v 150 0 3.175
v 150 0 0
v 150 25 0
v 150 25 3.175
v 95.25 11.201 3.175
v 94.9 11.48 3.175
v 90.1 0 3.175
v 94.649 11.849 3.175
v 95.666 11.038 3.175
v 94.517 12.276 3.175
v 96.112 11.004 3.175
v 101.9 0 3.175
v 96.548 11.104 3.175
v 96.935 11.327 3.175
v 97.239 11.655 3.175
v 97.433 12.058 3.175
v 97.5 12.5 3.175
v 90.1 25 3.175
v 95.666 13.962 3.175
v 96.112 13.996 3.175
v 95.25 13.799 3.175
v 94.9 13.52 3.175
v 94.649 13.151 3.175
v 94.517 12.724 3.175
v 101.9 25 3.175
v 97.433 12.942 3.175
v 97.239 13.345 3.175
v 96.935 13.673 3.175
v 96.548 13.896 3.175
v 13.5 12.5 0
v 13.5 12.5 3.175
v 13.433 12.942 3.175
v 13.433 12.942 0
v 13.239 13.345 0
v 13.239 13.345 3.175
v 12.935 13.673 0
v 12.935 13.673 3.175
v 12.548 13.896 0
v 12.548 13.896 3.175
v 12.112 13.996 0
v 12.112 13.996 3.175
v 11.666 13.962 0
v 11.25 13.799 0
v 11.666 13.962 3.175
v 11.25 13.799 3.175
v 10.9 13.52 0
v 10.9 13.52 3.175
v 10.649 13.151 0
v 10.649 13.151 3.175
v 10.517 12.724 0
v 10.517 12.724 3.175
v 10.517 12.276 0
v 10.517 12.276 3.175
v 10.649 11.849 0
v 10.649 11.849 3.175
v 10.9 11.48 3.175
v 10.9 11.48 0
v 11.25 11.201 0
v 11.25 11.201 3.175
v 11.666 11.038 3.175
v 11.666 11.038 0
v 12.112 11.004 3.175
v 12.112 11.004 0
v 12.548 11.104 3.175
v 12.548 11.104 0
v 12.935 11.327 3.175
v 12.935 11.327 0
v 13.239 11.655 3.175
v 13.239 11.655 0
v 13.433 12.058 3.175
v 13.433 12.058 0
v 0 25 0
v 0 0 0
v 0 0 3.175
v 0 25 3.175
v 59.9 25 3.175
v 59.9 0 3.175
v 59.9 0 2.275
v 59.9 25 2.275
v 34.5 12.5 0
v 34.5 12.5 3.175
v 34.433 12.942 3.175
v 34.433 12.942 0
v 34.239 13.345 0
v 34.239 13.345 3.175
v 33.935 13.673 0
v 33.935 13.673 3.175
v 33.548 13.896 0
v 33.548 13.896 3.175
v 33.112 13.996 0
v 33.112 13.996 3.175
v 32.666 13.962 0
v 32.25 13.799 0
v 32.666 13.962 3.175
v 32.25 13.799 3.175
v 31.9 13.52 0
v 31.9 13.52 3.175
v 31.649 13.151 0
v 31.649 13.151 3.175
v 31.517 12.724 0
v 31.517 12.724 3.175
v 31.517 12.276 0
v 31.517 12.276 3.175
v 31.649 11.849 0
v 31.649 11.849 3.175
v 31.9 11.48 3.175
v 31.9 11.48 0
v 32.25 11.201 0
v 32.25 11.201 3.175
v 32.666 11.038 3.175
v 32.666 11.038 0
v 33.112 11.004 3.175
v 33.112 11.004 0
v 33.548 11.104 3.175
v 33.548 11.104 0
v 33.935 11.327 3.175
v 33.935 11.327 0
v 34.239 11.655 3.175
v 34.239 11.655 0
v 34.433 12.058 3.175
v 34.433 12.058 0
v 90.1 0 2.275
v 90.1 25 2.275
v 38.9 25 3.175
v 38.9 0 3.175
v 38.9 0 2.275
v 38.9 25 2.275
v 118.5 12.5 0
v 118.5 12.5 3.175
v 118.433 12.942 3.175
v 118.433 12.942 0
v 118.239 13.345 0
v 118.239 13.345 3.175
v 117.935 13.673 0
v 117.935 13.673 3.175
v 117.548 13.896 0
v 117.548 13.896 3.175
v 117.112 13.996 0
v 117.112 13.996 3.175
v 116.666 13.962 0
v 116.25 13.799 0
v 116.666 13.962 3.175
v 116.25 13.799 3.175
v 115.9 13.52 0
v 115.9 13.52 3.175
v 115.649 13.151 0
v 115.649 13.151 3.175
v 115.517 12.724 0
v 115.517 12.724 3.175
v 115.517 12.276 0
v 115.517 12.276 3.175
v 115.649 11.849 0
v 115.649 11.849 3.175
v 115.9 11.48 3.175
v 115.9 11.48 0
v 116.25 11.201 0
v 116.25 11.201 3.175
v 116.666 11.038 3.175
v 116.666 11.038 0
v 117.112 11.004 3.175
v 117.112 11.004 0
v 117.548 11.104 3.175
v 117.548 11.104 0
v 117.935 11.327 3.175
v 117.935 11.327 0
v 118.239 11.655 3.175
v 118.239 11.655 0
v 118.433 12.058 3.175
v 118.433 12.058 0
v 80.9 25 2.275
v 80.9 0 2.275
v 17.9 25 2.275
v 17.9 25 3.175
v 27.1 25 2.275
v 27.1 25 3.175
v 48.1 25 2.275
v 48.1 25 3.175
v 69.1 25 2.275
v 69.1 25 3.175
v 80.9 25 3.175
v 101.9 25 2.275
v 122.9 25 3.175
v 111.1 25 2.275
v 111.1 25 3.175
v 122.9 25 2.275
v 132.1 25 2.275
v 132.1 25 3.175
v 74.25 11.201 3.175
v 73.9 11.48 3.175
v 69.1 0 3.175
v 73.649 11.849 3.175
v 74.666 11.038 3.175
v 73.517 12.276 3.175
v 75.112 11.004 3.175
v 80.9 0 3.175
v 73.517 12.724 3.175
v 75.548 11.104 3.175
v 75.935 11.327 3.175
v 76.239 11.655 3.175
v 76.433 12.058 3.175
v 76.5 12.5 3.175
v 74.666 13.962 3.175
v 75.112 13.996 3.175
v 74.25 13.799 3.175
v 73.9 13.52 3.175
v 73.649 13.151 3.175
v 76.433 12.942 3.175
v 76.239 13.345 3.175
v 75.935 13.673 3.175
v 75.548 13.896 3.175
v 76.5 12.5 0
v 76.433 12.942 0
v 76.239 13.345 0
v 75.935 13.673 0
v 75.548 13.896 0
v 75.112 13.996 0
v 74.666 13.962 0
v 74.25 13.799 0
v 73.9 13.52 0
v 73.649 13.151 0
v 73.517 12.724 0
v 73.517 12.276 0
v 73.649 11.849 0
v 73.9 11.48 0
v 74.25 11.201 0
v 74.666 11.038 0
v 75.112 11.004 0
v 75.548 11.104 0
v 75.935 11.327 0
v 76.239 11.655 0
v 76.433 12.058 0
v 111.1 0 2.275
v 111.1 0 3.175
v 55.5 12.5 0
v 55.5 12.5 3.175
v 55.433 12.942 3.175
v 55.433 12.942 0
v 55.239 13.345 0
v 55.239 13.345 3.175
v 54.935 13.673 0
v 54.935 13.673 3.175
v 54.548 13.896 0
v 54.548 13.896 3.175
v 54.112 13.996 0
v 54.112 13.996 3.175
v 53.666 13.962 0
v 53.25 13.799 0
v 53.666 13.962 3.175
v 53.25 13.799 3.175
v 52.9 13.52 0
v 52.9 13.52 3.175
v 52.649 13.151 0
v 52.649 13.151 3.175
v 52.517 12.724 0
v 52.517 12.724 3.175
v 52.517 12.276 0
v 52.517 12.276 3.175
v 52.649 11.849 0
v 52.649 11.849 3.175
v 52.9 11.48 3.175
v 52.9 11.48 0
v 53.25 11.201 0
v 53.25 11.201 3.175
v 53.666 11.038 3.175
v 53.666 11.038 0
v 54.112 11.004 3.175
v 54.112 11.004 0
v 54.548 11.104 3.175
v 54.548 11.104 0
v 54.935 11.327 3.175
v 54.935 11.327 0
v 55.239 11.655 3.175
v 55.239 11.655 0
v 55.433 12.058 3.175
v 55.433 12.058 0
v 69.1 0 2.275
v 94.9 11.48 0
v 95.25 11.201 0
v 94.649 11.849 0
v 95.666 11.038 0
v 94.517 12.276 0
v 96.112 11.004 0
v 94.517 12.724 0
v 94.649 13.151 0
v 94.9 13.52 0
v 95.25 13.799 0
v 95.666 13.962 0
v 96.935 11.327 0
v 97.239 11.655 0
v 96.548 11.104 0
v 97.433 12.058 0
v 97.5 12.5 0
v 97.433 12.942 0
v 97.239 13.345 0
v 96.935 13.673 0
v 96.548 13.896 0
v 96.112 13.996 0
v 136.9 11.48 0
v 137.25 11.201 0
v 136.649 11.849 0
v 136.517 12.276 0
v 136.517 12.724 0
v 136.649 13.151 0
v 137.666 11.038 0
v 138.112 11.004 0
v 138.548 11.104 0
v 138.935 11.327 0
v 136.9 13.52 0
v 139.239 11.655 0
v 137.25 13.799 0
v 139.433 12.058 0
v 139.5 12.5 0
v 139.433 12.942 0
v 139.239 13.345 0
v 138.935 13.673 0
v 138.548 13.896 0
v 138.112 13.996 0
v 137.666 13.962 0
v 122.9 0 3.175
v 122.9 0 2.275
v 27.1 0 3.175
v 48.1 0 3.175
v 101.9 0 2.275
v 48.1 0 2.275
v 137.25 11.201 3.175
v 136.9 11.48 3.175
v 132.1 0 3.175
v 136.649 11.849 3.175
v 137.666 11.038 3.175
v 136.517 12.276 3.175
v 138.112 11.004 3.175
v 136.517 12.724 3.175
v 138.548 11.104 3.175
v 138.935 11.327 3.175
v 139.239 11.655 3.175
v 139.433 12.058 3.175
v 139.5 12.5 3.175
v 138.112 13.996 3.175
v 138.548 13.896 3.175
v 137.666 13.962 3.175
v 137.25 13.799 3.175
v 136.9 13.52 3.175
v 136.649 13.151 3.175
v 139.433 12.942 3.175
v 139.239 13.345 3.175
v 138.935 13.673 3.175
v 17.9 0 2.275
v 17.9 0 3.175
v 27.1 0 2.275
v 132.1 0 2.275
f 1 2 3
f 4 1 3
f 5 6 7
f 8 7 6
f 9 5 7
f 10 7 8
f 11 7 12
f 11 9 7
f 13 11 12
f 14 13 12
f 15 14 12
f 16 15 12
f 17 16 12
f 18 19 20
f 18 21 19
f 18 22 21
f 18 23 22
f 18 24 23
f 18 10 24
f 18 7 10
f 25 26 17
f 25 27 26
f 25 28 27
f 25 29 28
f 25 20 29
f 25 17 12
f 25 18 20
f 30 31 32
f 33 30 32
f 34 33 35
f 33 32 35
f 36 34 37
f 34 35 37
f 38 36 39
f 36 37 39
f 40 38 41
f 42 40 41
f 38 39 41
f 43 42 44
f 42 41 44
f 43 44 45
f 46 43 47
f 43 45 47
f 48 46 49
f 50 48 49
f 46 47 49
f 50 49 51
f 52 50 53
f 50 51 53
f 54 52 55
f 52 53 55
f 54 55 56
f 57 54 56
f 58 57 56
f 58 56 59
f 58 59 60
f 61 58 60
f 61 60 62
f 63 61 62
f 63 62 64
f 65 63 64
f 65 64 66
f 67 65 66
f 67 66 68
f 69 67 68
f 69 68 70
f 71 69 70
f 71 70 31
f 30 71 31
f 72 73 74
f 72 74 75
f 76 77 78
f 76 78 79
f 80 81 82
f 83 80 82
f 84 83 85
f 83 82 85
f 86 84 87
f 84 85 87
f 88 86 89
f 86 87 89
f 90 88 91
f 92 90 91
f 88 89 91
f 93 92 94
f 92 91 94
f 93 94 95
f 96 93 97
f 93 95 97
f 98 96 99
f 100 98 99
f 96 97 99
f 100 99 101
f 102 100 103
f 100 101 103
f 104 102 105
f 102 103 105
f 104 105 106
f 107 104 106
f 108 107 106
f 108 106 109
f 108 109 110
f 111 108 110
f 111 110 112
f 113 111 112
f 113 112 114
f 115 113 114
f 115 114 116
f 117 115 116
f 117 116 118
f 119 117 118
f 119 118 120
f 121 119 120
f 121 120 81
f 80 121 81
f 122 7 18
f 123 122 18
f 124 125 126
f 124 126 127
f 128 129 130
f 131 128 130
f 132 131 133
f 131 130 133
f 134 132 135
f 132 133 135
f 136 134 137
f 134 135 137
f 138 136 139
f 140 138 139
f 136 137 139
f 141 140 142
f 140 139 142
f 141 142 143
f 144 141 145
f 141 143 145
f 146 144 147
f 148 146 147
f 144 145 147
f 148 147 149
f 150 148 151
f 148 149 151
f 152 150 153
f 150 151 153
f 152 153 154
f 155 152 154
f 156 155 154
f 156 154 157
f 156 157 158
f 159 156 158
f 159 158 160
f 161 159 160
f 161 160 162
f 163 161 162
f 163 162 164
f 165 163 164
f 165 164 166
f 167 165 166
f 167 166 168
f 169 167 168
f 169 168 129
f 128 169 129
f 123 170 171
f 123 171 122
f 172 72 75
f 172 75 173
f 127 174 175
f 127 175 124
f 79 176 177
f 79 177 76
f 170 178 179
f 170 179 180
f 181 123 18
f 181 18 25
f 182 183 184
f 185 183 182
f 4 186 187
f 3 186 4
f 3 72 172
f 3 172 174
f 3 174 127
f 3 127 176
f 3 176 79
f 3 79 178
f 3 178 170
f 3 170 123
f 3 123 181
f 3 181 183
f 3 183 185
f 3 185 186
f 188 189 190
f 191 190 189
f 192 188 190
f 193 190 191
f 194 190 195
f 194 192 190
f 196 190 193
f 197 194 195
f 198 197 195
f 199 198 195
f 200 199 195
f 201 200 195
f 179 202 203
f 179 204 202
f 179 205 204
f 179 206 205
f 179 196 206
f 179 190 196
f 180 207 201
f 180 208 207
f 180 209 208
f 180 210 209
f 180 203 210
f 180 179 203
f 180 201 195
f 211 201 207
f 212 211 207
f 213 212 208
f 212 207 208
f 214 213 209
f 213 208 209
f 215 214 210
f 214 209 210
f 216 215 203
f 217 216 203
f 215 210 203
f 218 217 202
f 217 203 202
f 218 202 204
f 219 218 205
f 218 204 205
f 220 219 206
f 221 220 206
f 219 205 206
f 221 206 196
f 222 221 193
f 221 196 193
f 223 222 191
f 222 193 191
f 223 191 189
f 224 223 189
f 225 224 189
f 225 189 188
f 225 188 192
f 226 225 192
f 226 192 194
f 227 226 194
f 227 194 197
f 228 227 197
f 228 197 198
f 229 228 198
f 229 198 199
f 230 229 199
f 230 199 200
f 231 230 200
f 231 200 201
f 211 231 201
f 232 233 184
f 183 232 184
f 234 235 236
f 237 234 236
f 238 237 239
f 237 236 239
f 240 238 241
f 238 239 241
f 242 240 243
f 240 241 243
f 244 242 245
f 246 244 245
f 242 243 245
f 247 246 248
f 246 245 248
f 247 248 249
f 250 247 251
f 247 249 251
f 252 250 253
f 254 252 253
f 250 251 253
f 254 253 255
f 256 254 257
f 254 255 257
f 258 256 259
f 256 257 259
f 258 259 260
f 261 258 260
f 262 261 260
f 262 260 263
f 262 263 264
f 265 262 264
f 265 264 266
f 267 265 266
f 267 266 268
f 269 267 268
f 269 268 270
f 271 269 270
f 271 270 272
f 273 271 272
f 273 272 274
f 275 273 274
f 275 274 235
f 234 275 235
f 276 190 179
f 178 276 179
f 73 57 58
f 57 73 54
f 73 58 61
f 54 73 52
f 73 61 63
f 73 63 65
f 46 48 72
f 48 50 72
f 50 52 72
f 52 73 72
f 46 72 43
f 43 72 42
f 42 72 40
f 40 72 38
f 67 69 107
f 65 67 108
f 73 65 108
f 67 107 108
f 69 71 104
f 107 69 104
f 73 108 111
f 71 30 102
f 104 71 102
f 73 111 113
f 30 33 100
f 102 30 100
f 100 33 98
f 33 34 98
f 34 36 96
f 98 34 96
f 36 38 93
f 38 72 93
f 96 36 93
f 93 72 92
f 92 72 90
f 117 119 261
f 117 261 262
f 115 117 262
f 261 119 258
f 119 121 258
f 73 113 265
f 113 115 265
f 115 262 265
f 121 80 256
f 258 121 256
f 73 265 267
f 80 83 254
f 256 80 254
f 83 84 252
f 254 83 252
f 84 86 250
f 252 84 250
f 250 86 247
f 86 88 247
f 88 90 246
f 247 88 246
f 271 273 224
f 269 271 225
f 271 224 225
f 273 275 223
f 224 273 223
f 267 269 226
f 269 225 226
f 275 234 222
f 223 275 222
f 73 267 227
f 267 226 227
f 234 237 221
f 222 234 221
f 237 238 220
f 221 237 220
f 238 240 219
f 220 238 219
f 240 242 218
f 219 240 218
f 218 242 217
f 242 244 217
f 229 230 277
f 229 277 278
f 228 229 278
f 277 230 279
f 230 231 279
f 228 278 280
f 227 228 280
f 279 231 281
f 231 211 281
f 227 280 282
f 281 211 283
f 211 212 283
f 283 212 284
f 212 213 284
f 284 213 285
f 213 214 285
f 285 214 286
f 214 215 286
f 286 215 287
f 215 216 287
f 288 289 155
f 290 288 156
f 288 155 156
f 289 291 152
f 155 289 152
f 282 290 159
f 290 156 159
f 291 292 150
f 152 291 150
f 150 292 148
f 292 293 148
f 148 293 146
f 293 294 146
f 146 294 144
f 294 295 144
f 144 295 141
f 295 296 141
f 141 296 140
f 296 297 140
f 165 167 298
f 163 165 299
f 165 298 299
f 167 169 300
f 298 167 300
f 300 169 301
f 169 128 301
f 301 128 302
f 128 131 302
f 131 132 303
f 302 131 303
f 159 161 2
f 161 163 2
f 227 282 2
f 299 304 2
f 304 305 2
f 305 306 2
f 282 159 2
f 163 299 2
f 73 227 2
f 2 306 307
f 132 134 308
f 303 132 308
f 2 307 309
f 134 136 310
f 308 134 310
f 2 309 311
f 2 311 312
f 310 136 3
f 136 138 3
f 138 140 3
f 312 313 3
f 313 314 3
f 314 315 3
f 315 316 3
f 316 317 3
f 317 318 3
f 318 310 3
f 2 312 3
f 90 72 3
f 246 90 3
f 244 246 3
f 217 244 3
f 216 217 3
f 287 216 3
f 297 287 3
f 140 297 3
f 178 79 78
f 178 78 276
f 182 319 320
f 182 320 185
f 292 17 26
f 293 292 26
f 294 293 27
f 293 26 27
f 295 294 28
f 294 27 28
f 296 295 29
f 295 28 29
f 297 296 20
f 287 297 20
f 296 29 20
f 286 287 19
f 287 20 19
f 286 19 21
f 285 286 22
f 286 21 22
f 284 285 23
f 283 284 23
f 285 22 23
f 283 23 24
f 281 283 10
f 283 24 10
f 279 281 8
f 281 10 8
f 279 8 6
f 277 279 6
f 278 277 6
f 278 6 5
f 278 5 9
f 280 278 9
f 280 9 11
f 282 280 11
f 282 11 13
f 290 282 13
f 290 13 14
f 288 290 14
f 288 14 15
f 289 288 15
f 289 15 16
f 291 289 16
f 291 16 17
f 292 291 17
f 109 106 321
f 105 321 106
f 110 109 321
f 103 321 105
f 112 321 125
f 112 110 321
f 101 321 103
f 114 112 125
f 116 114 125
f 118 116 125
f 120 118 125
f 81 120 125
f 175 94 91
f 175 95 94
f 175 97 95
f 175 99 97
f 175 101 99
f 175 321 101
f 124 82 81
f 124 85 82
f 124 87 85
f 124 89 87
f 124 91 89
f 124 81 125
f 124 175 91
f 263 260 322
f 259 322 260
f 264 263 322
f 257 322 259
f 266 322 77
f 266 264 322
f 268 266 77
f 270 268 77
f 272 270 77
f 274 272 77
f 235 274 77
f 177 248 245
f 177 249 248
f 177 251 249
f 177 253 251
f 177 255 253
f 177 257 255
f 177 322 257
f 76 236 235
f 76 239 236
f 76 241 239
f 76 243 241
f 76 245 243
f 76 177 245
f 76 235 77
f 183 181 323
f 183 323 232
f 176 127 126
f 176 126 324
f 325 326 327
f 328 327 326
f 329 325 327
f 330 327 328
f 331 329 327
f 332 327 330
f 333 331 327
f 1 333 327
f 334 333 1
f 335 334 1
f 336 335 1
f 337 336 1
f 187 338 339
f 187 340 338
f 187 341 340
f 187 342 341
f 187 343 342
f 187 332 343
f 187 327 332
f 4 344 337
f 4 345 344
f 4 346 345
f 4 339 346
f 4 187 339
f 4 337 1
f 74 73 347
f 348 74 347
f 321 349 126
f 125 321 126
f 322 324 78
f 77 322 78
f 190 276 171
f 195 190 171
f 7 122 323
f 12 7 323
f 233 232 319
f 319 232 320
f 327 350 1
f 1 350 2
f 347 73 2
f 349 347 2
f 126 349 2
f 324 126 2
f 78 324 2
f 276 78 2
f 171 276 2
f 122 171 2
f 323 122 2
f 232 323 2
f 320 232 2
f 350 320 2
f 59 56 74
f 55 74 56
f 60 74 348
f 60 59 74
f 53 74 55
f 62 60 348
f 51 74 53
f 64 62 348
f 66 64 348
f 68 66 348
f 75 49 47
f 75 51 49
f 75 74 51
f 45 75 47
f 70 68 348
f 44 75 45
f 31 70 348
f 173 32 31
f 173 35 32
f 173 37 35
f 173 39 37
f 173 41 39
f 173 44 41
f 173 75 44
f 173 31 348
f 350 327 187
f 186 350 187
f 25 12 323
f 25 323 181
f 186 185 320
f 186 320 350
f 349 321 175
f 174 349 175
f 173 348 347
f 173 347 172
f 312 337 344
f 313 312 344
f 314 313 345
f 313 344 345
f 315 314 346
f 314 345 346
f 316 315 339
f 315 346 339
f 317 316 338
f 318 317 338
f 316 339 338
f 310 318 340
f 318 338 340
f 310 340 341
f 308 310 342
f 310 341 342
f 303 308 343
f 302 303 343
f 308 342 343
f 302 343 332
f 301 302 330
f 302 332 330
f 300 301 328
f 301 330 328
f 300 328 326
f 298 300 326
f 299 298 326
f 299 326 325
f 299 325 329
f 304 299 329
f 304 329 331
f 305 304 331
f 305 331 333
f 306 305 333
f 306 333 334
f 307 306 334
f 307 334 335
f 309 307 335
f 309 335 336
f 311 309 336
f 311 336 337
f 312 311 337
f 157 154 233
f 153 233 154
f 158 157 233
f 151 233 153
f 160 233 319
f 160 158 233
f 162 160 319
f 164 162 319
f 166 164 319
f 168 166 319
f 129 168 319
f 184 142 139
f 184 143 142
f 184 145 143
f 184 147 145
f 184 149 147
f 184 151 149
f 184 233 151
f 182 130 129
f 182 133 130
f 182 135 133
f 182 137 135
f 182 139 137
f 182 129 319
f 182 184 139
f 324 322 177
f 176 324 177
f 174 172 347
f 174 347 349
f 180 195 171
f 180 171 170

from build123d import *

# Parameters (mm, degrees)
F0_W     = 150
F0_H     = 25
F1_DEPTH = 3.175
F2_W     = 9.2
F2_H     = 25
F3_DEPTH = 0.9
F4_R     = 1.5
F5_DEPTH = 25


with BuildPart() as f1:
    # F0 (on Top) → F1 (new body)
    with BuildSketch(Plane.XY):
        with Locations((75, 12.5)):
            Rectangle(F0_W, F0_H)
    extrude(amount=F1_DEPTH)

    # F2 (on face) → F3 (cut)
    with BuildSketch(Plane.XY.offset(3.175)):
        with Locations((22.5, 12.5)):
            Rectangle(F2_W, F2_H)
        with Locations((43.5, 12.5)):
            Rectangle(F2_W, F2_H)
        with Locations((64.5, 12.5)):
            Rectangle(F2_W, F2_H)
        with Locations((85.5, 12.5)):
            Rectangle(F2_W, F2_H)
        with Locations((106.5, 12.5)):
            Rectangle(F2_W, F2_H)
        with Locations((127.5, 12.5)):
            Rectangle(F2_W, F2_H)
    extrude(amount=-F3_DEPTH, mode=Mode.SUBTRACT)

    # F4 (on face) → F5 (cut)
    with BuildSketch(Plane.XY.offset(3.175)):
        with Locations((12, 12.5)):
            Circle(F4_R)
        with Locations((33, 12.5)):
            Circle(F4_R)
        with Locations((54, 12.5)):
            Circle(F4_R)
        with Locations((75, 12.5)):
            Circle(F4_R)
        with Locations((96, 12.5)):
            Circle(F4_R)
        with Locations((117, 12.5)):
            Circle(F4_R)
        with Locations((138, 12.5)):
            Circle(F4_R)
    extrude(amount=-F5_DEPTH, mode=Mode.SUBTRACT)


solid = f1.part
